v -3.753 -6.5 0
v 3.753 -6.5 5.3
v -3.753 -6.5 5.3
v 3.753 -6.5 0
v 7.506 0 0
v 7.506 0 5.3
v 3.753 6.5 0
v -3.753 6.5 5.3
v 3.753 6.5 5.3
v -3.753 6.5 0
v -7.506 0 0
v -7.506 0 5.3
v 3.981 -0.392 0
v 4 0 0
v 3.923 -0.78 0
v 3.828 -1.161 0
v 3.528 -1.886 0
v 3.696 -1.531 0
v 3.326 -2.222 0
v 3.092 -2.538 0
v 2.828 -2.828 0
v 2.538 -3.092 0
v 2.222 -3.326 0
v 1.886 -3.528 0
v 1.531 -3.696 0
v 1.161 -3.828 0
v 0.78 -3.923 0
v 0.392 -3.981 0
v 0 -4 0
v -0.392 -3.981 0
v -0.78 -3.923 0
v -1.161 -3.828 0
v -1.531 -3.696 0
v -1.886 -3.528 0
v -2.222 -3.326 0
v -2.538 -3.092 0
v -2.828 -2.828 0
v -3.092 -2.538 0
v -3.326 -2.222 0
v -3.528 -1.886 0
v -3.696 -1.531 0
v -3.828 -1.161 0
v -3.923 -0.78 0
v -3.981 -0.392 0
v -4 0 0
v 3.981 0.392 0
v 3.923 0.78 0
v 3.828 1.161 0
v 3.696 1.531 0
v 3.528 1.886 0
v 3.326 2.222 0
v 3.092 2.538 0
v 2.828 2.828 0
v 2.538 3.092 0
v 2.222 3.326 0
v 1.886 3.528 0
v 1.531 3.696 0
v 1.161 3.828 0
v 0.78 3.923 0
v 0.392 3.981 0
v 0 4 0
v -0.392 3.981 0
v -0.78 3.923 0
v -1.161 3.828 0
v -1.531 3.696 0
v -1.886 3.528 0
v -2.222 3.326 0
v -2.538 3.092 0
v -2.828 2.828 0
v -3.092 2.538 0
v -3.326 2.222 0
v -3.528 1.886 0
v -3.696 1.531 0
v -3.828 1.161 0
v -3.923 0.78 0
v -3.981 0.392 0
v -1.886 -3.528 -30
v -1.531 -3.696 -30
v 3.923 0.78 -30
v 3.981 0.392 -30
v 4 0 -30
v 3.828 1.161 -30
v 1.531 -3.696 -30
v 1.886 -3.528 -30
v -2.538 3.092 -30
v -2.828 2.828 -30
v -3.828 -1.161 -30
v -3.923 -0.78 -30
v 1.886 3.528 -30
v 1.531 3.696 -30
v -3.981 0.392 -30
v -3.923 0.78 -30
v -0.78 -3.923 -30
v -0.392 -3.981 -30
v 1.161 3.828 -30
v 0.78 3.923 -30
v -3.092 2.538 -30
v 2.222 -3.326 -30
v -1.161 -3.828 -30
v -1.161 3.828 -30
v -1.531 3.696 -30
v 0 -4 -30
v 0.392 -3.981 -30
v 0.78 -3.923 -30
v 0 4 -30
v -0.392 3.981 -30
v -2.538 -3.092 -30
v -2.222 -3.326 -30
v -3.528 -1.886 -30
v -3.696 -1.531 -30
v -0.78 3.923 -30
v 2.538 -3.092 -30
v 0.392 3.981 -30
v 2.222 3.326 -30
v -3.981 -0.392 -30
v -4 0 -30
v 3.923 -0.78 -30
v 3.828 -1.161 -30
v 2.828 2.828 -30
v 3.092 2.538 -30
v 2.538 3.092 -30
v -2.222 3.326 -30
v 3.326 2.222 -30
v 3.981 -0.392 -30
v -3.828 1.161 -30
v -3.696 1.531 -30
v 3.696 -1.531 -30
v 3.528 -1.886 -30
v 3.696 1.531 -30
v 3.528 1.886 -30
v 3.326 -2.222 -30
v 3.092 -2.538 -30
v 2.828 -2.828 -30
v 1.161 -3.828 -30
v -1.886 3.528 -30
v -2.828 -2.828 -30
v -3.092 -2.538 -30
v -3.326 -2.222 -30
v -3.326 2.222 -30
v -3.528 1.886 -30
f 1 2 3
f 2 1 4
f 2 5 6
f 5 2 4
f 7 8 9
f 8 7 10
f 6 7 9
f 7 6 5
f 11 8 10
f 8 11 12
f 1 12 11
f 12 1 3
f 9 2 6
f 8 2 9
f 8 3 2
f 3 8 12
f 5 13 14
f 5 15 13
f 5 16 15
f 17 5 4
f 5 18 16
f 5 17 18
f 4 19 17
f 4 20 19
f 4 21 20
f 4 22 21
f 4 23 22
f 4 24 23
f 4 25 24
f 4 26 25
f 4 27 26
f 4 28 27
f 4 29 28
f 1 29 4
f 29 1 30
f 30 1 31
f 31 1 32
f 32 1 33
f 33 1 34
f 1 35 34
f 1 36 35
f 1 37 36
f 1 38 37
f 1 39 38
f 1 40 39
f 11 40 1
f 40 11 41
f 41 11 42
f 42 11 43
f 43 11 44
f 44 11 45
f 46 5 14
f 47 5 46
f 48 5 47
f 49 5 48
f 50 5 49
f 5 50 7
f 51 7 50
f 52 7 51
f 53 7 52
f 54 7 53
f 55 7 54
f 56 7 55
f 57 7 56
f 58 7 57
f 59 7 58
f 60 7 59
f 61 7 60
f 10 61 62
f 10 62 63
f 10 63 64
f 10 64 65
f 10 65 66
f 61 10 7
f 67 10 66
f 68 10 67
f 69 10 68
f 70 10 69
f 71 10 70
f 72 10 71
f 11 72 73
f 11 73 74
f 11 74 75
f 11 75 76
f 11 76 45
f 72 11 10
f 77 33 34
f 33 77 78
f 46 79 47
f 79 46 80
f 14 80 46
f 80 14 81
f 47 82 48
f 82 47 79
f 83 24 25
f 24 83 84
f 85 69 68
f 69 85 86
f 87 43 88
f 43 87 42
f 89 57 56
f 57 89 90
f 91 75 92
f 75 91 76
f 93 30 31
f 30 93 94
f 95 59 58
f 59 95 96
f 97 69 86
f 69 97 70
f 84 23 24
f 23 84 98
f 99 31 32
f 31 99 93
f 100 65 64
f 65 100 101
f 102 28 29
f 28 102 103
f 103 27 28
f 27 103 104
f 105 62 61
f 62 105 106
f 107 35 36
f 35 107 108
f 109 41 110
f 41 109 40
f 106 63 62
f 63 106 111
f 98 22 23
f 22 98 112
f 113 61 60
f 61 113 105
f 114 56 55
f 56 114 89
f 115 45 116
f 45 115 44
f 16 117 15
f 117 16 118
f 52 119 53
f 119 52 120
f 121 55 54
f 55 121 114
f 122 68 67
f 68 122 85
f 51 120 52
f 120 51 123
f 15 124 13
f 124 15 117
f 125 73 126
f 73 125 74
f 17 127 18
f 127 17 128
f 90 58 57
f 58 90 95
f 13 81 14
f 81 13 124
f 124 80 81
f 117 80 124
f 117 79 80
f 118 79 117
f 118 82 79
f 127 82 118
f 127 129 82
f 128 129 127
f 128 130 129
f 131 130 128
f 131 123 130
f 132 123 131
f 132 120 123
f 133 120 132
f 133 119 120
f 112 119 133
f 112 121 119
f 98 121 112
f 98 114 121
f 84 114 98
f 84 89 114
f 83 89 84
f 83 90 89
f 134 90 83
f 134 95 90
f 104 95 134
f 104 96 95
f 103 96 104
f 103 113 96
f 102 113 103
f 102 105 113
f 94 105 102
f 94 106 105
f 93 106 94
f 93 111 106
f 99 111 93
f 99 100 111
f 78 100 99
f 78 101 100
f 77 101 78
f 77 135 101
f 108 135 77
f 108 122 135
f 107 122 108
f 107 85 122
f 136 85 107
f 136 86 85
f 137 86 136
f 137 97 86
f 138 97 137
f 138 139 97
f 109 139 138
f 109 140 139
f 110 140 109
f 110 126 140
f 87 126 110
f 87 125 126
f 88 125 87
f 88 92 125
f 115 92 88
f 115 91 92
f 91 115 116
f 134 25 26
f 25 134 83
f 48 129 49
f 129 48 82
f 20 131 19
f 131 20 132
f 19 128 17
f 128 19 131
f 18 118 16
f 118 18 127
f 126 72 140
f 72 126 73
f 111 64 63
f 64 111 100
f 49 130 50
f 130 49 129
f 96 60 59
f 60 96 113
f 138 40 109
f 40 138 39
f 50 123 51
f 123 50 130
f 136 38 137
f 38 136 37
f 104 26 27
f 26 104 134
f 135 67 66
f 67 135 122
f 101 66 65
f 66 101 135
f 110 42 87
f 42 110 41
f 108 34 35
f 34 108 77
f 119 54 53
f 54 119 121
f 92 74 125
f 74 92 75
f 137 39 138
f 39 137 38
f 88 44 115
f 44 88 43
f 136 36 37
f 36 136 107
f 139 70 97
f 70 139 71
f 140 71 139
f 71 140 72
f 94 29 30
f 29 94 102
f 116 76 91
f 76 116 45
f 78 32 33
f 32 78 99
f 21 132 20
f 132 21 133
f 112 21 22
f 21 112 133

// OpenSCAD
// M8 hex bolt (threads omitted)

across_flats = 13;
head_height = 5.3;
shank_dia = 8;
shank_len = 30;

// Head: hexagonal prism, bottom at z=0
translate([0, 0, head_height/2])
    cylinder(h = head_height, r = across_flats / sqrt(3), $fn = 6, center = true);

// Shank: cylinder extending into z<0
translate([0, 0, -shank_len])
    cylinder(h = shank_len, d = shank_dia, $fn = 64);
